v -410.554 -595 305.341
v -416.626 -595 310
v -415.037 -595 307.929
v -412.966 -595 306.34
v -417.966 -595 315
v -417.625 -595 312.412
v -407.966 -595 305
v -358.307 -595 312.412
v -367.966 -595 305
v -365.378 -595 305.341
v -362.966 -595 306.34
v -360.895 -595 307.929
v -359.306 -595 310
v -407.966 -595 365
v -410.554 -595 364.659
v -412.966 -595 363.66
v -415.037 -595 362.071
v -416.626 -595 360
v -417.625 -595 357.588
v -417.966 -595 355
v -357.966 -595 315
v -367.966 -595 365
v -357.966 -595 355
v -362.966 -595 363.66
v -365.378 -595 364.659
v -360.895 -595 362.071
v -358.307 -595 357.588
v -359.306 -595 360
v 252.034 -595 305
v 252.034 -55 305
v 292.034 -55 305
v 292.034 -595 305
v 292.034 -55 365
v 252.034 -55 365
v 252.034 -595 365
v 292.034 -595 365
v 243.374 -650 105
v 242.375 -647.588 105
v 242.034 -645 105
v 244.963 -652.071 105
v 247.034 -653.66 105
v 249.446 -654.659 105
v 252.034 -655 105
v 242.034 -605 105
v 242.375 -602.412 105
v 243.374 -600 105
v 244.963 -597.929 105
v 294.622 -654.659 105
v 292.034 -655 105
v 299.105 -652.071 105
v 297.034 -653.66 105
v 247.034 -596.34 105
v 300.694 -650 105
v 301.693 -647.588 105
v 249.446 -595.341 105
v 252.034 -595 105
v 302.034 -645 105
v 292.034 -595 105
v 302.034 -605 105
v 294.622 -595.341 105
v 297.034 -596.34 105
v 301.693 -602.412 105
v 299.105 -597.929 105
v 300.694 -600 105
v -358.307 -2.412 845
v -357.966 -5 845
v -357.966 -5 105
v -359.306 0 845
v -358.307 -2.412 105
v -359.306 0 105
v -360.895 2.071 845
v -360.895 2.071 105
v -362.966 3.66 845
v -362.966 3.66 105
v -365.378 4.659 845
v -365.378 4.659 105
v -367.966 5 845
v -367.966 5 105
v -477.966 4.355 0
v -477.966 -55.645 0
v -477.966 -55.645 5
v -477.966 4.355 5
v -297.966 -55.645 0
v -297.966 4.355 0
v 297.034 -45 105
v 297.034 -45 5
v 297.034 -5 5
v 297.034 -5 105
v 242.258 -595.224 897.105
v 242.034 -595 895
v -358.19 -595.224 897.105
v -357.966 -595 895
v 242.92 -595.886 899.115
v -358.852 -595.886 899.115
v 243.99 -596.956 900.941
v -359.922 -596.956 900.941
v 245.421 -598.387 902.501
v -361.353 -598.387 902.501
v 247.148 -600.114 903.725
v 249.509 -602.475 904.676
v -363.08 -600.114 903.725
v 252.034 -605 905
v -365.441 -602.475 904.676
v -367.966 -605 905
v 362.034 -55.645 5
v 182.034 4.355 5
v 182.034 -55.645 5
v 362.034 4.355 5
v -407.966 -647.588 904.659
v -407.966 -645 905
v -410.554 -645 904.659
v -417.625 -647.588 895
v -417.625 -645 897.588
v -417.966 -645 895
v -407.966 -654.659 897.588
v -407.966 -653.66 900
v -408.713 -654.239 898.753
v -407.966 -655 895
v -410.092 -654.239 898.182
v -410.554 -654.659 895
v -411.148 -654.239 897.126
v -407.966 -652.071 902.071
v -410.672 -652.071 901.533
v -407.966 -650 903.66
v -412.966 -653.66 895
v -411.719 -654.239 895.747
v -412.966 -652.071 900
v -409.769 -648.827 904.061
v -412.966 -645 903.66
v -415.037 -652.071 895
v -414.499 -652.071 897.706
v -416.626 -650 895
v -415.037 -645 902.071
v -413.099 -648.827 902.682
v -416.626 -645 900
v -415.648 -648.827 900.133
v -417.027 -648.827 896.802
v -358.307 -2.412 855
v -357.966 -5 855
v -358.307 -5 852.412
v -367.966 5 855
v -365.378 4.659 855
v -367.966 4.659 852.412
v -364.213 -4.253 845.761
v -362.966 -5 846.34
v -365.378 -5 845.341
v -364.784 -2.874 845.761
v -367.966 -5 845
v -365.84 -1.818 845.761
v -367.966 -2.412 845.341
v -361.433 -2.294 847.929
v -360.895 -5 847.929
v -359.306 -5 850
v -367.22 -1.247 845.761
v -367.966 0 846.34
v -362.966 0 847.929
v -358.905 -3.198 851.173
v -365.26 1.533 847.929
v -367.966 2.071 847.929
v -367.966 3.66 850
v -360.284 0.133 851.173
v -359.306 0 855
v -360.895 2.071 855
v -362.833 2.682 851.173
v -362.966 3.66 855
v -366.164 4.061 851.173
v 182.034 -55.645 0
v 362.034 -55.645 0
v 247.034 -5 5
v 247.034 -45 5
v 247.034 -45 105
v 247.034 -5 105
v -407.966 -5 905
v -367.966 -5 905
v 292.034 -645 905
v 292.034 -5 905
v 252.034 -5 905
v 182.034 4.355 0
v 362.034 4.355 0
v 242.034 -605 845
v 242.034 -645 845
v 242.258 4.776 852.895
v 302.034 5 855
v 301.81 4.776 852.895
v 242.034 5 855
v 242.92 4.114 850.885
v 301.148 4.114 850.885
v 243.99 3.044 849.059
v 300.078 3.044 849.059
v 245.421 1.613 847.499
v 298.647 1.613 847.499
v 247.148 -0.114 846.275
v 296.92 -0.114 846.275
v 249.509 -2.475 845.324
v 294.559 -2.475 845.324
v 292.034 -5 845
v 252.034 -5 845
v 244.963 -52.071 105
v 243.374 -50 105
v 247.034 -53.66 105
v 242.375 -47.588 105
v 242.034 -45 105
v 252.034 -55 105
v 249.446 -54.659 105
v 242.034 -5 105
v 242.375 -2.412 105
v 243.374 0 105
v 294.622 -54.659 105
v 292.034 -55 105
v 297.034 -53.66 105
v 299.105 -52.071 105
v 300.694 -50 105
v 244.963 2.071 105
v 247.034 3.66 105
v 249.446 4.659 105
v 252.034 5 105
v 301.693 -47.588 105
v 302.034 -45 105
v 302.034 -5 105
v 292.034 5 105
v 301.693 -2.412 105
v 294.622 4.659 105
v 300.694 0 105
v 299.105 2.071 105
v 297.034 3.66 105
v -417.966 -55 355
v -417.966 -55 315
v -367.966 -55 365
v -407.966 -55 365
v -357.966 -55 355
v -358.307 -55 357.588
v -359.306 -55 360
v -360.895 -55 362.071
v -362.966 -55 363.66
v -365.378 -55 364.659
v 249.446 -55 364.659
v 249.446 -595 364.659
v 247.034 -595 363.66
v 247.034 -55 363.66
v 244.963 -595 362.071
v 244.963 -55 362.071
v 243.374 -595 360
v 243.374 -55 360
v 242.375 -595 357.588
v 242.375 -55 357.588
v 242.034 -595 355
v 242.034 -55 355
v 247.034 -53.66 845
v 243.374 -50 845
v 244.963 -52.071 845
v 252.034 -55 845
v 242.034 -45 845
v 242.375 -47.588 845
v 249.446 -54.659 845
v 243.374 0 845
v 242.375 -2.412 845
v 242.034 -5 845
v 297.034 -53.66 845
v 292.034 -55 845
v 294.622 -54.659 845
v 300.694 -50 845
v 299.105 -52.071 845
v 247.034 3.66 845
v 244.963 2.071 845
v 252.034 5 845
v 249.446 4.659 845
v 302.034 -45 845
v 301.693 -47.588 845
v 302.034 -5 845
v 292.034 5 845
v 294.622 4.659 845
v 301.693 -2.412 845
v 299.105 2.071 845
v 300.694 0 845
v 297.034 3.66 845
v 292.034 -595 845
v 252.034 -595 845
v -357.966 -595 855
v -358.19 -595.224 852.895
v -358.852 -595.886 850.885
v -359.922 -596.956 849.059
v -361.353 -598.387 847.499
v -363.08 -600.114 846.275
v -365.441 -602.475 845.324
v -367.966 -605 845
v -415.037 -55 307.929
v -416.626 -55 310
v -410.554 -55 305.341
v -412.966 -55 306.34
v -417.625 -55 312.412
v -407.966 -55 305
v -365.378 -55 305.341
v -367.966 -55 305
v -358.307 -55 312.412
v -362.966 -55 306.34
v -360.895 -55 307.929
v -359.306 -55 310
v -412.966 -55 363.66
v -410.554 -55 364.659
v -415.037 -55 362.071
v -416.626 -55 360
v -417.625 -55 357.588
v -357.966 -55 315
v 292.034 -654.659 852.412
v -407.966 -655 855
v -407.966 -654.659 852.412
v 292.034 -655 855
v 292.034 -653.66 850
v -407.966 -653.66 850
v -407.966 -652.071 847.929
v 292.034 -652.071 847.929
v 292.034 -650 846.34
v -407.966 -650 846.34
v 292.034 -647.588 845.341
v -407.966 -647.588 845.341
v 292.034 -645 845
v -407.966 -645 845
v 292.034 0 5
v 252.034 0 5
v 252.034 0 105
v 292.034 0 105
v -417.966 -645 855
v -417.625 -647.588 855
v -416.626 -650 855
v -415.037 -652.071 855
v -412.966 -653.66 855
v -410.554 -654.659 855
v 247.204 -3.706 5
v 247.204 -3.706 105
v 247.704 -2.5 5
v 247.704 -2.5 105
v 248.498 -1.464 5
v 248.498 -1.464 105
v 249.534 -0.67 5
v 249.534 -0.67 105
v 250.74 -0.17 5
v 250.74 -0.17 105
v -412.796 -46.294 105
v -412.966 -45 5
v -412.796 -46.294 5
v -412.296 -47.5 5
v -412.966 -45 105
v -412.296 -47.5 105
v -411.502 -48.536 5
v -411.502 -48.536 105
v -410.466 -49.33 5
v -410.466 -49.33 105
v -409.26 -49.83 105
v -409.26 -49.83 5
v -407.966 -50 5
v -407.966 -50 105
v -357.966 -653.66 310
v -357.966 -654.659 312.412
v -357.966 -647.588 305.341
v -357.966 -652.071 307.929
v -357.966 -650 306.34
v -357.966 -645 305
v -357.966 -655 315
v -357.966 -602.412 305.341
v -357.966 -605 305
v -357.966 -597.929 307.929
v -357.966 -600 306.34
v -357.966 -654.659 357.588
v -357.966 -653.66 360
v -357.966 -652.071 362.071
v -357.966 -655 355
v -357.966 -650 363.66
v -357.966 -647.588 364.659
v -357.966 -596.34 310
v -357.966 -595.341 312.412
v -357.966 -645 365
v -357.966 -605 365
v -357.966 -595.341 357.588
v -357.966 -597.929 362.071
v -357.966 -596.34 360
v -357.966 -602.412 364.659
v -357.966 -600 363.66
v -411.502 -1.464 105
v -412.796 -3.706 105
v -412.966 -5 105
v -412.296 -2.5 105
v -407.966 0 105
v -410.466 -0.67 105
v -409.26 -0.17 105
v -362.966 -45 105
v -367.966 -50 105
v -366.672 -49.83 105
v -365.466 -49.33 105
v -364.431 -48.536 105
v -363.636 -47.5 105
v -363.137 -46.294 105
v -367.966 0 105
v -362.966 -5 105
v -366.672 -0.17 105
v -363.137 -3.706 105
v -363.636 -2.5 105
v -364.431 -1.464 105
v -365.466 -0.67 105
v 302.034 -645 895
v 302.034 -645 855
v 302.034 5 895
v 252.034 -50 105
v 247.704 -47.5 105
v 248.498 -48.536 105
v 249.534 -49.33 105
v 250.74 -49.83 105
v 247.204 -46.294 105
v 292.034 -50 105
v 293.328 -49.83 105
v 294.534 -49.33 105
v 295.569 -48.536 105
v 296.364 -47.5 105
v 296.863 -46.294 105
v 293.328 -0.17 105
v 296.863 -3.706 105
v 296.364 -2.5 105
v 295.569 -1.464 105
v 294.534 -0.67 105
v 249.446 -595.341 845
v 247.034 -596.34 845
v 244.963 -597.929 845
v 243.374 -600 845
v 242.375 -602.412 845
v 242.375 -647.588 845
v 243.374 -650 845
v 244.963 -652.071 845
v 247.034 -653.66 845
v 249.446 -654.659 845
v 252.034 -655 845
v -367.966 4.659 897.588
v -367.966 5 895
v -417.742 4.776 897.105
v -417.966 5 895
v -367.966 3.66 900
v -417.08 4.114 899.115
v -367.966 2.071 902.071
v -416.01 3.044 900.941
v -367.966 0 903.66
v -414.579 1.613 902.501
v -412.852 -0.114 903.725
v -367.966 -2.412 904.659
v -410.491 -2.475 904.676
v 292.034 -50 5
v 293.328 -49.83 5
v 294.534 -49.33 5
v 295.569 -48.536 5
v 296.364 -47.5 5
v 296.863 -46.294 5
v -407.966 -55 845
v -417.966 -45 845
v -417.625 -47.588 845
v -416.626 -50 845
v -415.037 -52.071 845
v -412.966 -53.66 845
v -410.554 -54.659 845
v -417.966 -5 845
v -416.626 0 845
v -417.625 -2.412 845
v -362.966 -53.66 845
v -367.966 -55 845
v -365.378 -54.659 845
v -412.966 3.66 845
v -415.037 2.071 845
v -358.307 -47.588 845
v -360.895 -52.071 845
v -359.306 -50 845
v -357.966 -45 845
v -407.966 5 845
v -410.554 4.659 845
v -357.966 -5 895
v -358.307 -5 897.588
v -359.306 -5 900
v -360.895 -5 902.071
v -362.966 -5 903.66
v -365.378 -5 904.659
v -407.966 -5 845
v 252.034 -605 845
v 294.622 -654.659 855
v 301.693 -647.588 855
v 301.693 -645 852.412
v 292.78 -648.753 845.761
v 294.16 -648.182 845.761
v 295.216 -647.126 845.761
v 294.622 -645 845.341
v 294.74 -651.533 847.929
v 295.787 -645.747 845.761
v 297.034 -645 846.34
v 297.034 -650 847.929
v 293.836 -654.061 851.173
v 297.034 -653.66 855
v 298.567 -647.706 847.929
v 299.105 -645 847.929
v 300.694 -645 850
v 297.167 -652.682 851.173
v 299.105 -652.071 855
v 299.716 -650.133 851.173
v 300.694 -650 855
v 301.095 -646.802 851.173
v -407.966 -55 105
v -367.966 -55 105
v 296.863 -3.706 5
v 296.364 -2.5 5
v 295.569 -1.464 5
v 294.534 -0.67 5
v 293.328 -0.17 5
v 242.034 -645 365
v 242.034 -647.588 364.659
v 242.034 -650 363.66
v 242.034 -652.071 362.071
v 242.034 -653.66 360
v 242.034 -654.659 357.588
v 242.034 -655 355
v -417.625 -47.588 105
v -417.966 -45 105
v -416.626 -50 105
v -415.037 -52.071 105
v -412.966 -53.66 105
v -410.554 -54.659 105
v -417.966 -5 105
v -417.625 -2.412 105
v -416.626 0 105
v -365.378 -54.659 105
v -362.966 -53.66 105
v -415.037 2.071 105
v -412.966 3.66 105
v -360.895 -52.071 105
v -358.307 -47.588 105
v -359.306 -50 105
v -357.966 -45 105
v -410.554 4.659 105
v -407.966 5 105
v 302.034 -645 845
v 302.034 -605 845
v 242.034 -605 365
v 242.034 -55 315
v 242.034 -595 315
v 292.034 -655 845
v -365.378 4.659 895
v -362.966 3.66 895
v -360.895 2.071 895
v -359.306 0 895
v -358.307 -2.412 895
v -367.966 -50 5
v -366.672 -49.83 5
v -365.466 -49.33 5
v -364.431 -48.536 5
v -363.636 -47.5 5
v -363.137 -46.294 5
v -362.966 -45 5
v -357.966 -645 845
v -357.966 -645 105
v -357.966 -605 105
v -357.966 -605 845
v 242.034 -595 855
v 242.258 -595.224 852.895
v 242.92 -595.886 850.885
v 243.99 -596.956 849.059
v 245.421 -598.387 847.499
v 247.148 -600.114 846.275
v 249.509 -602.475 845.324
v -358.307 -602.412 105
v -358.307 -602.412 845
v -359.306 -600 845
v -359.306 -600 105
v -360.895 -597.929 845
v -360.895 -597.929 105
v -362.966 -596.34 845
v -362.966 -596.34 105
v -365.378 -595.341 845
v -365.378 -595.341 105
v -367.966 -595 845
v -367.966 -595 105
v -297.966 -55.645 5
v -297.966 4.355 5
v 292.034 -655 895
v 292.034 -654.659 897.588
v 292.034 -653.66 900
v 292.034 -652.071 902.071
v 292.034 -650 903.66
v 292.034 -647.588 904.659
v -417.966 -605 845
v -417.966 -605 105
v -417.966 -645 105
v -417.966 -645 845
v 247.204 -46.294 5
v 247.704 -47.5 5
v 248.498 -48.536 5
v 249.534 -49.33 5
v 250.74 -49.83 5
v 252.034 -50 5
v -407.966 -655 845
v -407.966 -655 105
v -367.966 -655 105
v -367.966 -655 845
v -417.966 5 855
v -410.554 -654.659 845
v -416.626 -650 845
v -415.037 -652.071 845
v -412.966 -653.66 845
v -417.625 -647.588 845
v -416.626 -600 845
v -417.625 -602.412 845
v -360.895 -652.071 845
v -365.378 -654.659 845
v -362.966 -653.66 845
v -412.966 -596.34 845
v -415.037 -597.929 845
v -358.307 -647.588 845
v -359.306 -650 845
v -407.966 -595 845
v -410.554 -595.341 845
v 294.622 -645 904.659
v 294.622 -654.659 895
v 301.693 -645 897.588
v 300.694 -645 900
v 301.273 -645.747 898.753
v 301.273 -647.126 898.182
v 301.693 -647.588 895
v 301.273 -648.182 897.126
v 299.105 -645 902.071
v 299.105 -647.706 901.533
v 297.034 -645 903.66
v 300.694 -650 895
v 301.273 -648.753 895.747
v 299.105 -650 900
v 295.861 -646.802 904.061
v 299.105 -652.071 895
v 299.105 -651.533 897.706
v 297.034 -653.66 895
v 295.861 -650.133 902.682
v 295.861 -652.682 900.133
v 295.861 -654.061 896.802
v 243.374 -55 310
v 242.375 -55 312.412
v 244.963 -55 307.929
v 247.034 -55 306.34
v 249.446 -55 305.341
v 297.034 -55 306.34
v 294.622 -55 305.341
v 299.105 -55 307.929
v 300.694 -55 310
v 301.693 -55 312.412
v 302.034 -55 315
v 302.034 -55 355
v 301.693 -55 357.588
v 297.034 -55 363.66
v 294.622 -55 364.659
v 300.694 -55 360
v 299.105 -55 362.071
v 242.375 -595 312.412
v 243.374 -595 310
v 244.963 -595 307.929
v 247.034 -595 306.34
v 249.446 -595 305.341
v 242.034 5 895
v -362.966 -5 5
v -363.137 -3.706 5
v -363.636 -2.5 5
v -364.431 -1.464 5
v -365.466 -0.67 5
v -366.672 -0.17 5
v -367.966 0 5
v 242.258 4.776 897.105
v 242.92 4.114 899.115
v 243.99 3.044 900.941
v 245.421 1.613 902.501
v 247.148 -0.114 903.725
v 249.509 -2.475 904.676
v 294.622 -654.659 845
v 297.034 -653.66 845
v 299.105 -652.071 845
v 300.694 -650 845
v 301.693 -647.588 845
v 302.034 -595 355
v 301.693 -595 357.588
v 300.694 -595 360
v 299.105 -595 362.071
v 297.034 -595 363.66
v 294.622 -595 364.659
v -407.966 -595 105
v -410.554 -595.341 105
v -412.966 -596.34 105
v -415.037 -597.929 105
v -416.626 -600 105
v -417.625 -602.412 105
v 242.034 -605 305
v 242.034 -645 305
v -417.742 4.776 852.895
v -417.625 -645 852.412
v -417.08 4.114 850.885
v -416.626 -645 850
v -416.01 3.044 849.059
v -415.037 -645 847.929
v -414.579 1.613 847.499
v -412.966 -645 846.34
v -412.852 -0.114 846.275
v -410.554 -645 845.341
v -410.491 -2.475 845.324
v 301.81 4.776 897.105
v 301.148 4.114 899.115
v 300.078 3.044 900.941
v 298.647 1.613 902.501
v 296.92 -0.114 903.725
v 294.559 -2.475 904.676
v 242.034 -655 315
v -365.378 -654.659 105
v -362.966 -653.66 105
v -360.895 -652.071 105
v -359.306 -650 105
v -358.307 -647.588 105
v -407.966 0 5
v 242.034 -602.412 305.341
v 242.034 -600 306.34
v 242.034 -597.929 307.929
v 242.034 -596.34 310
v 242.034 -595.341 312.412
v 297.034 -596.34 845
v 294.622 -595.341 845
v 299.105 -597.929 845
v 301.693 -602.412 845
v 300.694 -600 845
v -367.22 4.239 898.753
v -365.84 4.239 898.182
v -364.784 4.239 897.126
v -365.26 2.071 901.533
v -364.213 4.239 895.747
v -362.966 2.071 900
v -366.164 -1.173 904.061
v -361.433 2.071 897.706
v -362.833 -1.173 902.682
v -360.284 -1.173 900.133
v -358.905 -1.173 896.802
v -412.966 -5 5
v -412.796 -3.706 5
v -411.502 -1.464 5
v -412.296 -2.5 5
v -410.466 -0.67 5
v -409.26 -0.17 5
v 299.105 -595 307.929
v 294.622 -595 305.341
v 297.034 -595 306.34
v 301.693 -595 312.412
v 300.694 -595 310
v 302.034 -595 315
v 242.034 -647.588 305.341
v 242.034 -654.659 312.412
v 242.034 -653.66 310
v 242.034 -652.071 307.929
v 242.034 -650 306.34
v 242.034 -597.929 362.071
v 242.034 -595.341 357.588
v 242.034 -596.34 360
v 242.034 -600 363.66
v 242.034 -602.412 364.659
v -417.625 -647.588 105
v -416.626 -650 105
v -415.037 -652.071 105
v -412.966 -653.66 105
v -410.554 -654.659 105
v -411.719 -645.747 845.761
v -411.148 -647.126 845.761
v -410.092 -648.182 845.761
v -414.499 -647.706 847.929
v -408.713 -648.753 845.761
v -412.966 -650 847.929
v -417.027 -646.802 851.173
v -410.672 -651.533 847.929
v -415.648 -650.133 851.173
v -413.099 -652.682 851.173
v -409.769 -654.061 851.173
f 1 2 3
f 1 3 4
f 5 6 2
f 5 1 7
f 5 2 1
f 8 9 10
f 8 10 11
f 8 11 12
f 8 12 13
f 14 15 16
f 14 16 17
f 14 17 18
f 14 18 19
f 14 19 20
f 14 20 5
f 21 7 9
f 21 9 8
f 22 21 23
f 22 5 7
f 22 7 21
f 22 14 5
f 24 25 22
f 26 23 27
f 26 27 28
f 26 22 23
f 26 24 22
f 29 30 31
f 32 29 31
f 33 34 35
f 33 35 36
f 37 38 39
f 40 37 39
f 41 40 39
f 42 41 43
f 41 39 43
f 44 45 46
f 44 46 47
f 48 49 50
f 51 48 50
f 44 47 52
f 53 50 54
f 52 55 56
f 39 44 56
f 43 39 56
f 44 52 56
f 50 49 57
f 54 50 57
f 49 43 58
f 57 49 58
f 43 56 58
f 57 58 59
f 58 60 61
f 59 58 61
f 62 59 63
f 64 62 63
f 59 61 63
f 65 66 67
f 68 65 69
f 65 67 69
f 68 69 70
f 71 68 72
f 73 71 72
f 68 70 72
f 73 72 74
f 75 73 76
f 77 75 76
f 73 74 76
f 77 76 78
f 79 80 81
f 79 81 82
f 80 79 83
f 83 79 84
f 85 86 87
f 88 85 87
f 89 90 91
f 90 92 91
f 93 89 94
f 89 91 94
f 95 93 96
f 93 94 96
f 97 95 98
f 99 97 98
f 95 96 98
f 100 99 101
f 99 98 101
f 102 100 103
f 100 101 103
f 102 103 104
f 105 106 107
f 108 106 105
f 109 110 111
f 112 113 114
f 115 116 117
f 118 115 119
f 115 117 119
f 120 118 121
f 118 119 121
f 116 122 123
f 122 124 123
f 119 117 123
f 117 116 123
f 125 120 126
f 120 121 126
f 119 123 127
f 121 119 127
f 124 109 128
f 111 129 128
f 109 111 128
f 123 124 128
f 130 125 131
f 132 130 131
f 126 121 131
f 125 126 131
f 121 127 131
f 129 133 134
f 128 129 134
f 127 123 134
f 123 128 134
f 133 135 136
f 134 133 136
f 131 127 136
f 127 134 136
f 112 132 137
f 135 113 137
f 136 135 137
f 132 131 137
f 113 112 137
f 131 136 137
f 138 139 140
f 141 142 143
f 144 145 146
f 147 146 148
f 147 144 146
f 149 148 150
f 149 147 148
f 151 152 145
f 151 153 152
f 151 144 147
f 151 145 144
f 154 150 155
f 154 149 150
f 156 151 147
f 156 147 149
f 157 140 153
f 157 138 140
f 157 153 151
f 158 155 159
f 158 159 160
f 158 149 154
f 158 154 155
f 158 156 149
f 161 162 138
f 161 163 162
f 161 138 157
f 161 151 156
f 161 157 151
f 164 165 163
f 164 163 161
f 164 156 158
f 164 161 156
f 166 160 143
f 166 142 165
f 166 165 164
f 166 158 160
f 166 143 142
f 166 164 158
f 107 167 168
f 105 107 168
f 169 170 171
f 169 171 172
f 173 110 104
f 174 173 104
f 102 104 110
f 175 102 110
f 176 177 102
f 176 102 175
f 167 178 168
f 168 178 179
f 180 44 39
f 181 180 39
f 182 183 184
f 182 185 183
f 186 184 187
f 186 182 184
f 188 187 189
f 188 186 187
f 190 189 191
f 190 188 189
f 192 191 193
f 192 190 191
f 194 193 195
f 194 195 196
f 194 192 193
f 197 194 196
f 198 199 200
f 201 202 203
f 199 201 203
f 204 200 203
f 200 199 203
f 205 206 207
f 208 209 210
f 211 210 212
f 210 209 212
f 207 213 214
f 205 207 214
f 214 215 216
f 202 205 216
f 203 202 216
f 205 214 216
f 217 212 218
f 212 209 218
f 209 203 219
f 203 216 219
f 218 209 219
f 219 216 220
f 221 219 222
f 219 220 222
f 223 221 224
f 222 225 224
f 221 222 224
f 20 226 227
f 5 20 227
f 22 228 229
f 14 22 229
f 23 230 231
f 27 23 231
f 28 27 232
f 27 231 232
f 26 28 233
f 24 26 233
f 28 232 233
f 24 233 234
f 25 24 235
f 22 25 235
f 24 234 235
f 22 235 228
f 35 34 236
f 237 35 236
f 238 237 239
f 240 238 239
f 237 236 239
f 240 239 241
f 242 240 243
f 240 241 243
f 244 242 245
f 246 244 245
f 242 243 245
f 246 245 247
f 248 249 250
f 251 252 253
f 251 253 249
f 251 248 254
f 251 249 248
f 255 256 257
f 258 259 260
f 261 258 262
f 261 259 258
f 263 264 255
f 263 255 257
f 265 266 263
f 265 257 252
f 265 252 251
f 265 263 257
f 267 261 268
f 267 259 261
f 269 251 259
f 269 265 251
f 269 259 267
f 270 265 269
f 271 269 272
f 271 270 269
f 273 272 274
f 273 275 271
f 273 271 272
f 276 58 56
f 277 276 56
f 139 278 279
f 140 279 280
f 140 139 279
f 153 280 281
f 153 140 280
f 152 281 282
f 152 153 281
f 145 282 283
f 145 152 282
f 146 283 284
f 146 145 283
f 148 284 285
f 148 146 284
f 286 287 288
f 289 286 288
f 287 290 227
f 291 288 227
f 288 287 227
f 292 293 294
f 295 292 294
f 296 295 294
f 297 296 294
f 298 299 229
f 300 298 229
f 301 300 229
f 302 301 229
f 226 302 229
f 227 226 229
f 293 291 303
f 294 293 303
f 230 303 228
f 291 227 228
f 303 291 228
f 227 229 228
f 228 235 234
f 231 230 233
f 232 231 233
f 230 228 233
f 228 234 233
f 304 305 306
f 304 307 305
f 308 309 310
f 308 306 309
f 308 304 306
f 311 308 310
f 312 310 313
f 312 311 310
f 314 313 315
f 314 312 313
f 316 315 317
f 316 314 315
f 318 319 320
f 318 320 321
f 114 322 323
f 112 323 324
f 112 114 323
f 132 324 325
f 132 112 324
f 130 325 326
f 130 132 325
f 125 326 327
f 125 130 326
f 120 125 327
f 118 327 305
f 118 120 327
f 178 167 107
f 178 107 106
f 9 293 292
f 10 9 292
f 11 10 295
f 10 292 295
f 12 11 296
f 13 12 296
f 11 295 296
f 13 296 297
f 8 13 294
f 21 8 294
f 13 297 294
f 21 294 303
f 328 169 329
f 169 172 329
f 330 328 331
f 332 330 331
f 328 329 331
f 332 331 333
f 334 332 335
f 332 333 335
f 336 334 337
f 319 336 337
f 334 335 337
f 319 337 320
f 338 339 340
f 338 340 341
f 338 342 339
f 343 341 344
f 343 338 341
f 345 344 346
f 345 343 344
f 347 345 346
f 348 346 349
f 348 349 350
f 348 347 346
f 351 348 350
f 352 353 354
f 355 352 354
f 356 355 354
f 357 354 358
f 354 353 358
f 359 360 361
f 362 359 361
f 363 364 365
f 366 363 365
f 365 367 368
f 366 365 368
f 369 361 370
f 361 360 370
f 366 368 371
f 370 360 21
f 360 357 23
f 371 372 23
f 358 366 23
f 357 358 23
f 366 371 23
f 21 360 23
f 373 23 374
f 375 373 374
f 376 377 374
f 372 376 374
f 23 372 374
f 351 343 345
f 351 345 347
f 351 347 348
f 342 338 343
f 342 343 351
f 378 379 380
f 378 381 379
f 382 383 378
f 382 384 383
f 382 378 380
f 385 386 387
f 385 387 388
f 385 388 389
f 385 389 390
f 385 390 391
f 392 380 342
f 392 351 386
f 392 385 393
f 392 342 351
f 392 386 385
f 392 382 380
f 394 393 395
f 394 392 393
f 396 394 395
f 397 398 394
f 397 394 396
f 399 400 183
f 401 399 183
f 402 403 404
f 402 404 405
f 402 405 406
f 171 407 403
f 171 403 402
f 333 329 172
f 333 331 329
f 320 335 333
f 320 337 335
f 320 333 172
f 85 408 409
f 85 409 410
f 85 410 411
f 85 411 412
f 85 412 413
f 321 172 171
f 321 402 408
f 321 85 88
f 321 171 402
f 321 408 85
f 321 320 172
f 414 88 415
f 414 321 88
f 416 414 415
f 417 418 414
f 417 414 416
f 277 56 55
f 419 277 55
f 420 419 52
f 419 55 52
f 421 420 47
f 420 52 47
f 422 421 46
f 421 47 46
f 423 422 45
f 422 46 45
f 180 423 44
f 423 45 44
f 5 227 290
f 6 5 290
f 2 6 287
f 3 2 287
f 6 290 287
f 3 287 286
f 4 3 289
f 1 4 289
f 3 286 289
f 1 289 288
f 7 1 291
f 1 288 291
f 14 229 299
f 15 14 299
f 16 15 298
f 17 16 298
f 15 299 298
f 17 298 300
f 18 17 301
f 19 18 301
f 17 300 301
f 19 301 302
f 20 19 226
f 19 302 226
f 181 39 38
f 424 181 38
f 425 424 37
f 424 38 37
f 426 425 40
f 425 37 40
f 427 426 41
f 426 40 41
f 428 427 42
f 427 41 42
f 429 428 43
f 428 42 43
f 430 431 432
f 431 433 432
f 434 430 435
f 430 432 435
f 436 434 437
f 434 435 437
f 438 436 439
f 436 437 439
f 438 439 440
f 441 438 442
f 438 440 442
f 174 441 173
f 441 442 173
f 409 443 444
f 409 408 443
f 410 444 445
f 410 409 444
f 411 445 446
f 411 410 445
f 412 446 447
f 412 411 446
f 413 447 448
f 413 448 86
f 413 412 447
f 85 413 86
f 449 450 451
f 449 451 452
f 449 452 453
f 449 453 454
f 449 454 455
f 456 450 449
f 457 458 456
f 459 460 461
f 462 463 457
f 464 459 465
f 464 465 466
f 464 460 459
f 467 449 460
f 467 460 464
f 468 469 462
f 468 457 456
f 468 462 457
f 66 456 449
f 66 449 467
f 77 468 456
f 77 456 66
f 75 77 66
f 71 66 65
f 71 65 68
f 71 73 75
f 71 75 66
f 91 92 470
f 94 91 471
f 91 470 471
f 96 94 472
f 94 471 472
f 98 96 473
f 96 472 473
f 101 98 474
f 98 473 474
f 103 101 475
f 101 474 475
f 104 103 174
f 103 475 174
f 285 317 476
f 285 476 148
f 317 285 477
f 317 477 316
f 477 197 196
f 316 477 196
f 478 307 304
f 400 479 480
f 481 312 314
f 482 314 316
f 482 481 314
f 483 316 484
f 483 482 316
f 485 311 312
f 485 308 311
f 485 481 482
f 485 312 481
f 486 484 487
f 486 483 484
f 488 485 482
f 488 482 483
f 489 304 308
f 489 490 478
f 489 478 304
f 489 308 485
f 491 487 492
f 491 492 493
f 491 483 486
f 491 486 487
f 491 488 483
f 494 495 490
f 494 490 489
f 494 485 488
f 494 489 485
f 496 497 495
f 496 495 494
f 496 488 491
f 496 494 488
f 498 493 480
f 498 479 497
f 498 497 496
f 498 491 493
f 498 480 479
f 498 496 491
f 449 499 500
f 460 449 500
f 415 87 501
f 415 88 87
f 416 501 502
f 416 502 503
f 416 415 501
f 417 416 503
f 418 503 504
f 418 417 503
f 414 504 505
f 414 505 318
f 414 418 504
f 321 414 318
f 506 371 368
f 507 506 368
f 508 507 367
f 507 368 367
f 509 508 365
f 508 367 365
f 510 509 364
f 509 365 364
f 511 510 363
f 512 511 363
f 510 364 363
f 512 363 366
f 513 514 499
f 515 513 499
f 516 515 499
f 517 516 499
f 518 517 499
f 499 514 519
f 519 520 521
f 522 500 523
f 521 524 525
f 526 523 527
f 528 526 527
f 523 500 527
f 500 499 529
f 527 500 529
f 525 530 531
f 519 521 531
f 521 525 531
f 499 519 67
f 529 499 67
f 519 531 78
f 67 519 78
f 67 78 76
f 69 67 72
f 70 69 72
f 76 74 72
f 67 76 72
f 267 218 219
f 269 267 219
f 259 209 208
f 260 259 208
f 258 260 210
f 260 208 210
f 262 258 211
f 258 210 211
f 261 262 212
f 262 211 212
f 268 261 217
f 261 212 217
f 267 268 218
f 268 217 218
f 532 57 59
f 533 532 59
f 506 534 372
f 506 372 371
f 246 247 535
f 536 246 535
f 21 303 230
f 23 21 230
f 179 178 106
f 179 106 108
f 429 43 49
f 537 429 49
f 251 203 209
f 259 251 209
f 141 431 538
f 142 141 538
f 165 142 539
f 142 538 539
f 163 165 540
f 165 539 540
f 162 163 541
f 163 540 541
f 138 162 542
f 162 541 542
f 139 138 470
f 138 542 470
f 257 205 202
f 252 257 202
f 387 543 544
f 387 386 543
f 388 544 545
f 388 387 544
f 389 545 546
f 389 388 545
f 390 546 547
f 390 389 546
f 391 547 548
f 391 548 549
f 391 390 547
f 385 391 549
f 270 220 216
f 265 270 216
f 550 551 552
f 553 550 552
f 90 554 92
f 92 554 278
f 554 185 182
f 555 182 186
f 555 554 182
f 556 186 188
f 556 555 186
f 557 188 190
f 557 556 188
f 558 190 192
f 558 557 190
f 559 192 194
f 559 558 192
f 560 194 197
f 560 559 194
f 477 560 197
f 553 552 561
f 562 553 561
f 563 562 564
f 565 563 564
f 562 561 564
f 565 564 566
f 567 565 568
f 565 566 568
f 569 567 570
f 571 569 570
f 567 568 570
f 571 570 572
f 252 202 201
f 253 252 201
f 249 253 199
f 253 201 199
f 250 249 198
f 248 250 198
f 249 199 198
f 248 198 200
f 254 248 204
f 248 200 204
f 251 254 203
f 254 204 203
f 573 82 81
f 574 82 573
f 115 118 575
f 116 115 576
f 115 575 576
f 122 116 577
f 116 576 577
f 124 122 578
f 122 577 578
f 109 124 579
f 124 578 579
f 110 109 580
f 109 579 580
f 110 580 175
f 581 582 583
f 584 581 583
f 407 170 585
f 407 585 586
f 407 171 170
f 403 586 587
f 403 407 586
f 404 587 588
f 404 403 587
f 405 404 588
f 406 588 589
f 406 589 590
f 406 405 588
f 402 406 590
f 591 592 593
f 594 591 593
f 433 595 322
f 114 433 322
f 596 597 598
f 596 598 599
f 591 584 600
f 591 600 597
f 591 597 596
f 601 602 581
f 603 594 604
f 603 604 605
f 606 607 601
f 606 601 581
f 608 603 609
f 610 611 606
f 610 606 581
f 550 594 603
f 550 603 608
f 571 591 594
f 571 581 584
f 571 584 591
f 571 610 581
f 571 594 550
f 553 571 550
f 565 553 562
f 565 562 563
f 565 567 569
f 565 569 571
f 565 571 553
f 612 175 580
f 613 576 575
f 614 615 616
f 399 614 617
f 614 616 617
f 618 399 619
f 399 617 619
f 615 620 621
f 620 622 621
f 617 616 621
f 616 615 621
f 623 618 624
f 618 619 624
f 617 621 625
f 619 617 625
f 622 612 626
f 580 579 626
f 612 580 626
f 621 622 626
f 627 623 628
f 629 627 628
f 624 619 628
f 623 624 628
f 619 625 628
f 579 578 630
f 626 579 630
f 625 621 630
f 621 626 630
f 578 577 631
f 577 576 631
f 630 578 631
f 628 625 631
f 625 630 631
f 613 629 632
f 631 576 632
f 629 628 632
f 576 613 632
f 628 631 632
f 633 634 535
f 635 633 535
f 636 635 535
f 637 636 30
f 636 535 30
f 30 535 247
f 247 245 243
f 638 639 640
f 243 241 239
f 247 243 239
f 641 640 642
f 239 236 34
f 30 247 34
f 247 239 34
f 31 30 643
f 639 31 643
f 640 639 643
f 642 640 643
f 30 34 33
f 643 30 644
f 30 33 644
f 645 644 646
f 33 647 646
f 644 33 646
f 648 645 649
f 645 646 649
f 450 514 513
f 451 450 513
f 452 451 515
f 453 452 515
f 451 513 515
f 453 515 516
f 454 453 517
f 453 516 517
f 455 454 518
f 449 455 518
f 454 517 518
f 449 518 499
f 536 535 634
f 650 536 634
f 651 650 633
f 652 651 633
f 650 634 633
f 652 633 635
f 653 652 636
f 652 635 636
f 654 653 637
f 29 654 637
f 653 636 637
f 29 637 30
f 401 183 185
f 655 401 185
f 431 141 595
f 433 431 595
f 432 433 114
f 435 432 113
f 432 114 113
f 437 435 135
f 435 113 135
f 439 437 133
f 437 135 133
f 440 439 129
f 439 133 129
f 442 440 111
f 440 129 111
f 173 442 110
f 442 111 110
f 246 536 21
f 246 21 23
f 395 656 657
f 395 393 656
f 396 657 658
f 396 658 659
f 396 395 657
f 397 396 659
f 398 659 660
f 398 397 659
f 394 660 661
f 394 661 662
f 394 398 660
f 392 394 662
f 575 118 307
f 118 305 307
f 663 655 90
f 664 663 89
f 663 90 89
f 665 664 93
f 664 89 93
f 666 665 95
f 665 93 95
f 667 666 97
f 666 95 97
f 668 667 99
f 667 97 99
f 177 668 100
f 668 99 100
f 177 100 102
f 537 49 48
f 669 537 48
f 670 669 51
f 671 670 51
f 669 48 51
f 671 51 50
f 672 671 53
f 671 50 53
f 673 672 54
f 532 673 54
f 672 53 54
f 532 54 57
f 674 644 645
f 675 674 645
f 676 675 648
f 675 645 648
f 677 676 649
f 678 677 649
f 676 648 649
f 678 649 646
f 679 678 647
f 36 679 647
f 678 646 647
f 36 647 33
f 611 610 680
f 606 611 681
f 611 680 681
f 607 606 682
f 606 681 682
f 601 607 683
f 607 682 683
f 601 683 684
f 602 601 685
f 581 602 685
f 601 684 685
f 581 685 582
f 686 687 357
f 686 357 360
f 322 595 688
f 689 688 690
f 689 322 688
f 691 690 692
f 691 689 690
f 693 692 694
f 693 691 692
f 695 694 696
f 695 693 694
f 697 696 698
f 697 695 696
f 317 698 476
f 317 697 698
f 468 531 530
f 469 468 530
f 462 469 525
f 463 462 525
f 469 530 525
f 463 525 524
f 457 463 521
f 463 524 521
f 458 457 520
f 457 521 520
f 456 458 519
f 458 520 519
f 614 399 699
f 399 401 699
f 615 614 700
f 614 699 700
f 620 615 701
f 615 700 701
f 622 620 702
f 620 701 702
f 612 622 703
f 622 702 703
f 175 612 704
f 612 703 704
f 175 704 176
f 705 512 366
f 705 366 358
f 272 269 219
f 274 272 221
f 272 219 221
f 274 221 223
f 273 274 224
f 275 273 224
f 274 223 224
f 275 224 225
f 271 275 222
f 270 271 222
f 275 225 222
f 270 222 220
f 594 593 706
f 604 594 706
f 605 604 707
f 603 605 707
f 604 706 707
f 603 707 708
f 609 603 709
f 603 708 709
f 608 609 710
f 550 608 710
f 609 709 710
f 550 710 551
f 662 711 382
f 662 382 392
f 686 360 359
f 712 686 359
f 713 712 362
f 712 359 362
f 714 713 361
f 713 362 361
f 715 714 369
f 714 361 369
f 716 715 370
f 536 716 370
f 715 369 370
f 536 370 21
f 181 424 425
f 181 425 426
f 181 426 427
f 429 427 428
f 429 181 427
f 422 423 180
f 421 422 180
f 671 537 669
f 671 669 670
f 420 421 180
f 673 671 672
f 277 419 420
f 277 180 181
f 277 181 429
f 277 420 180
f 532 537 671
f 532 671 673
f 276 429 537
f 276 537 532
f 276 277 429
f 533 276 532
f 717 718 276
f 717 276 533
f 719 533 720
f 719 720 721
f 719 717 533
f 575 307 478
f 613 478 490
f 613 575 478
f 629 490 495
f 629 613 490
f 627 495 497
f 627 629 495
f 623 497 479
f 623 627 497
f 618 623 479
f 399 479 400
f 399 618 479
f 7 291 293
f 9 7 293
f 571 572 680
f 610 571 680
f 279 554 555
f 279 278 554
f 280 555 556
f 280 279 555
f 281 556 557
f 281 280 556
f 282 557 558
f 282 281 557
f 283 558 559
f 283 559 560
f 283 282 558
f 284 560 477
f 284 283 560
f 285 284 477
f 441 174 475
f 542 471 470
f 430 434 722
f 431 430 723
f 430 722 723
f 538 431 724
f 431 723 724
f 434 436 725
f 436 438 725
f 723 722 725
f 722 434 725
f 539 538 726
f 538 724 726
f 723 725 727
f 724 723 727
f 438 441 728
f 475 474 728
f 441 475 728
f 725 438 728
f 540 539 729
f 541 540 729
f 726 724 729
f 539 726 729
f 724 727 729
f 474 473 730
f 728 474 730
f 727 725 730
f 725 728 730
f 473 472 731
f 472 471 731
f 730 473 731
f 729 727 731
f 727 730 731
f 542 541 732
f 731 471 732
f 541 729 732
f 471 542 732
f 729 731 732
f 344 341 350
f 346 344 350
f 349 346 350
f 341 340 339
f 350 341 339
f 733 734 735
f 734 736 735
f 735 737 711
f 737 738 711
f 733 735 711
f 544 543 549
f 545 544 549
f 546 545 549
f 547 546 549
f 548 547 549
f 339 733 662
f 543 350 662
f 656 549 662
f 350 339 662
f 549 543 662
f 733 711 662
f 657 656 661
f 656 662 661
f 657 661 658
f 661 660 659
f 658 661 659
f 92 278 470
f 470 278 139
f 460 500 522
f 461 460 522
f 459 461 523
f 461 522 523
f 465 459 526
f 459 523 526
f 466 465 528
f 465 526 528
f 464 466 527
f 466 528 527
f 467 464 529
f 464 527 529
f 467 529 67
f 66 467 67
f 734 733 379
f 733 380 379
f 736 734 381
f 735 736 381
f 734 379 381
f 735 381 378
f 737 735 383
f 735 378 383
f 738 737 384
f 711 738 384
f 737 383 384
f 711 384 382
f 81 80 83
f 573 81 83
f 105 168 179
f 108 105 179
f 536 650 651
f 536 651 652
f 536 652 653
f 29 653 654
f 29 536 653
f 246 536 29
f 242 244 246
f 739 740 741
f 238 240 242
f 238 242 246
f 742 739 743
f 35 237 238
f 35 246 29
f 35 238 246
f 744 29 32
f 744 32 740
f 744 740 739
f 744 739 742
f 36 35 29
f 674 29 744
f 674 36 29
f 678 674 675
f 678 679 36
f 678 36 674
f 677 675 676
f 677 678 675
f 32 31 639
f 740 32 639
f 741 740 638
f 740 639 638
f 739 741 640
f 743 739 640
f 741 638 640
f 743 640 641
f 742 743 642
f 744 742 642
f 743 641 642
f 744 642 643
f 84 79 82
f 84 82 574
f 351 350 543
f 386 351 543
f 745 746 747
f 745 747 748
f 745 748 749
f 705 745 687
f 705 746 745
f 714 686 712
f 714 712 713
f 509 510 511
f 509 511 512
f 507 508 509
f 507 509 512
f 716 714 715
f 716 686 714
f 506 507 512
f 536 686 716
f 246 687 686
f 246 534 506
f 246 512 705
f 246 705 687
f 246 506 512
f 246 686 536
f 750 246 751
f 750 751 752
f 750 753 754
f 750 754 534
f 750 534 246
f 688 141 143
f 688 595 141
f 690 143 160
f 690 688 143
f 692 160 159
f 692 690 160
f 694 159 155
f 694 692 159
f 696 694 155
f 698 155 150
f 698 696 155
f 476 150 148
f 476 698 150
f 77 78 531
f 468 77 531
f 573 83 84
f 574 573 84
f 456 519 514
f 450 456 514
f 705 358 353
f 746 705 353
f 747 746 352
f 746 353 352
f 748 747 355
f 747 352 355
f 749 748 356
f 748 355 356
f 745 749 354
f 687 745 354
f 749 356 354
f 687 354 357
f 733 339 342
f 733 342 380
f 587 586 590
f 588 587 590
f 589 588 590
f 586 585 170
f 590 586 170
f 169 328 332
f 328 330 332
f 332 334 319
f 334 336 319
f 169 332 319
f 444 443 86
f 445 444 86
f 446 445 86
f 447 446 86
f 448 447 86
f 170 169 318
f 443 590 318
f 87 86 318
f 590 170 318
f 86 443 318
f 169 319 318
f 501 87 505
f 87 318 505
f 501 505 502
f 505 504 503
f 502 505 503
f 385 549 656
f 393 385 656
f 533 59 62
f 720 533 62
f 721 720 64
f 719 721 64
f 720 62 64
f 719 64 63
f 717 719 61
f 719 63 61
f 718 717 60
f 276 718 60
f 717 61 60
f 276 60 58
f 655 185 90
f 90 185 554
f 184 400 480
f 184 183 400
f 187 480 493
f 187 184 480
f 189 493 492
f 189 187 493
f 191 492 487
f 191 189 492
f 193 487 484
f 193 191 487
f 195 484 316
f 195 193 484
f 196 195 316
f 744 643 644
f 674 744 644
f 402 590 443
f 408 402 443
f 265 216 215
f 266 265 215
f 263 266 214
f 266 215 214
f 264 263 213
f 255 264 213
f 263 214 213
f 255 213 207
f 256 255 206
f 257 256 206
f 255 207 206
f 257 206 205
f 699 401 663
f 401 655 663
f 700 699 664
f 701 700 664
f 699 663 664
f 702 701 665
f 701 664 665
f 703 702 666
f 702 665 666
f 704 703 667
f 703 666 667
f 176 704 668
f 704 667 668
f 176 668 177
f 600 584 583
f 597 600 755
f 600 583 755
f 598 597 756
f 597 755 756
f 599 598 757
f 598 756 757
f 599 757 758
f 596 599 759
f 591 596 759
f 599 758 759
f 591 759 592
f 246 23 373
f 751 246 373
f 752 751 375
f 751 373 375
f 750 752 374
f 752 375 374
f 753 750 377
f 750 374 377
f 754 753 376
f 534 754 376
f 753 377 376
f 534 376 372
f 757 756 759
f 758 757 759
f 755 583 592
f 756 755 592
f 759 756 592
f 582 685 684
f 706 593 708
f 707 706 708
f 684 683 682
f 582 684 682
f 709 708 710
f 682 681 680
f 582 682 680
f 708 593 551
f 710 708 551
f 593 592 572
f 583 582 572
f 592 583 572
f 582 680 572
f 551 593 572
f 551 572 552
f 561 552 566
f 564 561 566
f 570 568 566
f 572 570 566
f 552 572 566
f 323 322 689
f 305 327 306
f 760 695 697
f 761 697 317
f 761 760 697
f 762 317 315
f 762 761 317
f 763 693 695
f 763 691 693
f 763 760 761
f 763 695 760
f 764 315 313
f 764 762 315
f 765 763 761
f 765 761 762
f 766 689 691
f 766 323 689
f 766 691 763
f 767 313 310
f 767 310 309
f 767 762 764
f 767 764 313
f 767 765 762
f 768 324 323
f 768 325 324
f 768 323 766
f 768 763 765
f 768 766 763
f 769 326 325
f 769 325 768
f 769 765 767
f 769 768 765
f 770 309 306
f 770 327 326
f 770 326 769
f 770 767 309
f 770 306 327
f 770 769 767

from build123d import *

# Parameters (mm, degrees)
F0_W      = 180
F0_H      = 60
F1_DEPTH  = 5
F2_W      = 50
F2_H      = 50
F3_DEPTH  = 100
F4_R      = 5
F4_2_R    = 5
F6_DEPTH  = 740
F8_DEPTH  = 60
F9_R      = 10
F11_DEPTH = 600
F13_DEPTH = 540
F12_W     = 40
F12_H     = 60


with BuildPart() as f1:
    # F0 (on Top) → F1 (new body)
    with BuildSketch(Plane.XY):
        with Locations((-387.9661596795, -25.6445559366)):
            Rectangle(F0_W, F0_H)
    extrude(amount=F1_DEPTH)


with BuildPart() as f1b:
    # F0 (on Top) → F1, piece 2 (new body)
    with BuildSketch(Plane.XY):
        with Locations((272.0338403205, -25.6445559366)):
            Rectangle(F0_W, F0_H)
    extrude(amount=F1_DEPTH)


with BuildPart() as f3:
    # F2 (on face) → F3 (new body)
    with BuildSketch(Plane.XY.offset(5)):
        with Locations((-387.9661596795, -25)):
            Rectangle(F2_W, F2_H)
    extrude(amount=F3_DEPTH)

    # F4
    f4_edges = [f3.edges().sort_by_distance(p)[0] for p in [
        (-412.96616, -50, 55),
        (-362.96616, -50, 55),
        (-412.96616, 0, 55),
        (-362.96616, 0, 55),
    ]]
    fillet(f4_edges, radius=F4_R)


with BuildPart() as f3b:
    # F2 (on face) → F3, piece 2 (new body)
    with BuildSketch(Plane.XY.offset(5)):
        with Locations((272.0338403205, -25)):
            Rectangle(F2_W, F2_H)
    extrude(amount=F3_DEPTH)

    # F4#2
    f4_2_edges = [f3b.edges().sort_by_distance(p)[0] for p in [
        (297.03384, 0, 55),
        (247.03384, 0, 55),
        (297.03384, -50, 55),
        (247.03384, -50, 55),
    ]]
    fillet(f4_2_edges, radius=F4_2_R)


with BuildPart() as f6:
    # F5 (on face) → F6 (new body)
    with BuildSketch(Plane.XY.offset(105)):
        with BuildLine():
            Line((-367.9661596795, 5), (-407.9661596795, 5))
            ThreePointArc((-407.9661596795, 5), (-415.0372274914, 2.0710678119), (-417.9661596795, -5))
            Line((-417.9661596795, -5), (-417.9661596795, -45))
            ThreePointArc((-417.9661596795, -45), (-415.0372274914, -52.0710678119), (-407.9661596795, -55))
            Line((-407.9661596795, -55), (-367.9661596795, -55))
            ThreePointArc((-367.9661596795, -55), (-360.8950918677, -52.0710678119), (-357.9661596795, -45))
            Line((-357.9661596795, -45), (-357.9661596795, -5))
            ThreePointArc((-357.9661596795, -5), (-360.8950918677, 2.0710678119), (-367.9661596795, 5))
        make_face()
        with BuildLine():
            Line((-407.9661596795, 0), (-367.9661596795, 0))
            ThreePointArc((-367.9661596795, 0), (-364.4306257736, -1.4644660941), (-362.9661596795, -5))
            Line((-362.9661596795, -5), (-362.9661596795, -45))
            ThreePointArc((-362.9661596795, -45), (-364.4306257736, -48.5355339059), (-367.9661596795, -50))
            Line((-367.9661596795, -50), (-407.9661596795, -50))
            ThreePointArc((-407.9661596795, -50), (-411.5016935855, -48.5355339059), (-412.9661596795, -45))
            Line((-412.9661596795, -45), (-412.9661596795, -5))
            ThreePointArc((-412.9661596795, -5), (-411.5016935855, -1.4644660941), (-407.9661596795, 0))
        make_face(mode=Mode.SUBTRACT)
        with BuildLine():
            ThreePointArc((-362.9661596795, -5), (-364.4306257736, -1.4644660941), (-367.9661596795, 0))
            Line((-367.9661596795, 0), (-407.9661596795, 0))
            ThreePointArc((-407.9661596795, 0), (-411.5016935855, -1.4644660941), (-412.9661596795, -5))
            Line((-412.9661596795, -5), (-412.9661596795, -45))
            ThreePointArc((-412.9661596795, -45), (-411.5016935855, -48.5355339059), (-407.9661596795, -50))
            Line((-407.9661596795, -50), (-367.9661596795, -50))
            ThreePointArc((-367.9661596795, -50), (-364.4306257736, -48.5355339059), (-362.9661596795, -45))
            Line((-362.9661596795, -45), (-362.9661596795, -5))
        make_face()
    extrude(amount=F6_DEPTH)


with BuildPart() as f6b:
    # F5 (on face) → F6, piece 2 (new body)
    with BuildSketch(Plane.XY.offset(105)):
        with BuildLine():
            Line((292.0338403205, 5), (252.0338403205, 5))
            ThreePointArc((252.0338403205, 5), (244.9627725086, 2.0710678119), (242.0338403205, -5))
            Line((242.0338403205, -5), (242.0338403205, -45))
            ThreePointArc((242.0338403205, -45), (244.9627725086, -52.0710678119), (252.0338403205, -55))
            Line((252.0338403205, -55), (292.0338403205, -55))
            ThreePointArc((292.0338403205, -55), (299.1049081323, -52.0710678119), (302.0338403205, -45))
            Line((302.0338403205, -45), (302.0338403205, -5))
            ThreePointArc((302.0338403205, -5), (299.1049081323, 2.0710678119), (292.0338403205, 5))
        make_face()
    extrude(amount=F6_DEPTH)


with BuildPart() as f6c:
    # F5 (on face) → F6, piece 3 (new body)
    with BuildSketch(Plane.XY.offset(105)):
        with BuildLine():
            ThreePointArc((242.0338403205, -645), (244.9627725086, -652.0710678119), (252.0338403205, -655))
            Line((252.0338403205, -655), (292.0338403205, -655))
            ThreePointArc((292.0338403205, -655), (299.1049081323, -652.0710678119), (302.0338403205, -645))
            Line((302.0338403205, -645), (302.0338403205, -605))
            ThreePointArc((302.0338403205, -605), (299.1049081323, -597.9289321881), (292.0338403205, -595))
            Line((292.0338403205, -595), (252.0338403205, -595))
            ThreePointArc((252.0338403205, -595), (244.9627725086, -597.9289321881), (242.0338403205, -605))
            Line((242.0338403205, -605), (242.0338403205, -645))
        make_face()
    extrude(amount=F6_DEPTH)


with BuildPart() as f6d:
    # F5 (on face) → F6, piece 4 (new body)
    with BuildSketch(Plane.XY.offset(105)):
        with BuildLine():
            ThreePointArc((-417.9661596795, -645), (-415.0372274914, -652.0710678119), (-407.9661596795, -655))
            Line((-407.9661596795, -655), (-367.9661596795, -655))
            ThreePointArc((-367.9661596795, -655), (-360.8950918677, -652.0710678119), (-357.9661596795, -645))
            Line((-357.9661596795, -645), (-357.9661596795, -605))
            ThreePointArc((-357.9661596795, -605), (-360.8950918677, -597.9289321881), (-367.9661596795, -595))
            Line((-367.9661596795, -595), (-407.9661596795, -595))
            ThreePointArc((-407.9661596795, -595), (-415.0372274914, -597.9289321881), (-417.9661596795, -605))
            Line((-417.9661596795, -605), (-417.9661596795, -645))
        make_face()
    extrude(amount=F6_DEPTH)


with BuildPart() as f8:
    # F7 (on face) → F8 (new body)
    with BuildSketch(Plane.XY.offset(845)):
        Polygon((-357.9661596795, 5), (-417.9661596795, 5), (-417.9661596795, -655), (302.0338403205, -655), (302.0338403205, 5), (242.0338403205, 5), (242.0338403205, -55), (242.0338403205, -595), (-357.9661596795, -595), (-357.9661596795, -55), align=None)
    extrude(amount=F8_DEPTH)

    # F9
    f9_edges = [f8.edges().sort_by_distance(p)[0] for p in [
        (-57.96616, -595, 905),
        (-357.96616, -295, 905),
        (-387.96616, 5, 905),
        (-417.96616, -325, 905),
        (-57.96616, -655, 905),
        (302.03384, -325, 905),
        (272.03384, 5, 905),
        (242.03384, -295, 905),
        (-417.96616, -655, 875),
        (302.03384, -655, 875),
        (-357.96616, 5, 875),
        (-57.96616, -595, 845),
        (-357.96616, -295, 845),
        (-387.96616, 5, 845),
        (-417.96616, -325, 845),
        (-57.96616, -655, 845),
        (302.03384, -325, 845),
        (272.03384, 5, 845),
        (242.03384, -295, 845),
    ]]
    fillet(f9_edges, radius=F9_R)


with BuildPart() as f11:
    # F10 (on face) → F11 (new body)
    with BuildSketch(Plane.YZ.offset(-357.9661596795)):
        with BuildLine():
            ThreePointArc((-655, 315), (-652.0710678119, 307.9289321881), (-645, 305))
            Line((-645, 305), (-605, 305))
            ThreePointArc((-605, 305), (-597.9289321881, 307.9289321881), (-595, 315))
            Line((-595, 315), (-595, 355))
            ThreePointArc((-595, 355), (-597.9289321881, 362.0710678119), (-605, 365))
            Line((-605, 365), (-645, 365))
            ThreePointArc((-645, 365), (-652.0710678119, 362.0710678119), (-655, 355))
            Line((-655, 355), (-655, 315))
        make_face()
    extrude(amount=F11_DEPTH)


with BuildPart() as f13:
    # F12 (on face) → F13 (new body)
    with BuildSketch(Plane.XZ.offset(55)):
        with BuildLine():
            ThreePointArc((-357.9661596795, 355), (-360.8950918677, 362.0710678119), (-367.9661596795, 365))
            Line((-367.9661596795, 365), (-407.9661596795, 365))
            ThreePointArc((-407.9661596795, 365), (-415.0372274914, 362.0710678119), (-417.9661596795, 355))
            Line((-417.9661596795, 355), (-417.9661596795, 315))
            ThreePointArc((-417.9661596795, 315), (-415.0372274914, 307.9289321881), (-407.9661596795, 305))
            Line((-407.9661596795, 305), (-367.9661596795, 305))
            ThreePointArc((-367.9661596795, 305), (-360.8950918677, 307.9289321881), (-357.9661596795, 315))
            Line((-357.9661596795, 315), (-357.9661596795, 355))
        make_face()
    extrude(amount=F13_DEPTH)


with BuildPart() as f13b:
    # F12 (on face) → F13, piece 2 (new body)
    with BuildSketch(Plane.XZ.offset(55)):
        with BuildLine():
            ThreePointArc((242.0338403205, 315), (244.9627725086, 307.9289321881), (252.0338403205, 305))
            Line((252.0338403205, 305), (252.0338403205, 365))
            ThreePointArc((252.0338403205, 365), (244.9627725086, 362.0710678119), (242.0338403205, 355))
            Line((242.0338403205, 355), (242.0338403205, 315))
        make_face()
        with Locations((272.0338403205, 335)):
            Rectangle(F12_W, F12_H)
        with BuildLine():
            Line((292.0338403205, 365), (292.0338403205, 305))
            ThreePointArc((292.0338403205, 305), (299.1049081323, 307.9289321881), (302.0338403205, 315))
            Line((302.0338403205, 315), (302.0338403205, 355))
            ThreePointArc((302.0338403205, 355), (299.1049081323, 362.0710678119), (292.0338403205, 365))
        make_face()
    extrude(amount=F13_DEPTH)


solid = Compound([f1.part, f1b.part, f3.part, f3b.part, f6.part, f6b.part, f6c.part, f6d.part, f8.part, f11.part, f13.part, f13b.part])
